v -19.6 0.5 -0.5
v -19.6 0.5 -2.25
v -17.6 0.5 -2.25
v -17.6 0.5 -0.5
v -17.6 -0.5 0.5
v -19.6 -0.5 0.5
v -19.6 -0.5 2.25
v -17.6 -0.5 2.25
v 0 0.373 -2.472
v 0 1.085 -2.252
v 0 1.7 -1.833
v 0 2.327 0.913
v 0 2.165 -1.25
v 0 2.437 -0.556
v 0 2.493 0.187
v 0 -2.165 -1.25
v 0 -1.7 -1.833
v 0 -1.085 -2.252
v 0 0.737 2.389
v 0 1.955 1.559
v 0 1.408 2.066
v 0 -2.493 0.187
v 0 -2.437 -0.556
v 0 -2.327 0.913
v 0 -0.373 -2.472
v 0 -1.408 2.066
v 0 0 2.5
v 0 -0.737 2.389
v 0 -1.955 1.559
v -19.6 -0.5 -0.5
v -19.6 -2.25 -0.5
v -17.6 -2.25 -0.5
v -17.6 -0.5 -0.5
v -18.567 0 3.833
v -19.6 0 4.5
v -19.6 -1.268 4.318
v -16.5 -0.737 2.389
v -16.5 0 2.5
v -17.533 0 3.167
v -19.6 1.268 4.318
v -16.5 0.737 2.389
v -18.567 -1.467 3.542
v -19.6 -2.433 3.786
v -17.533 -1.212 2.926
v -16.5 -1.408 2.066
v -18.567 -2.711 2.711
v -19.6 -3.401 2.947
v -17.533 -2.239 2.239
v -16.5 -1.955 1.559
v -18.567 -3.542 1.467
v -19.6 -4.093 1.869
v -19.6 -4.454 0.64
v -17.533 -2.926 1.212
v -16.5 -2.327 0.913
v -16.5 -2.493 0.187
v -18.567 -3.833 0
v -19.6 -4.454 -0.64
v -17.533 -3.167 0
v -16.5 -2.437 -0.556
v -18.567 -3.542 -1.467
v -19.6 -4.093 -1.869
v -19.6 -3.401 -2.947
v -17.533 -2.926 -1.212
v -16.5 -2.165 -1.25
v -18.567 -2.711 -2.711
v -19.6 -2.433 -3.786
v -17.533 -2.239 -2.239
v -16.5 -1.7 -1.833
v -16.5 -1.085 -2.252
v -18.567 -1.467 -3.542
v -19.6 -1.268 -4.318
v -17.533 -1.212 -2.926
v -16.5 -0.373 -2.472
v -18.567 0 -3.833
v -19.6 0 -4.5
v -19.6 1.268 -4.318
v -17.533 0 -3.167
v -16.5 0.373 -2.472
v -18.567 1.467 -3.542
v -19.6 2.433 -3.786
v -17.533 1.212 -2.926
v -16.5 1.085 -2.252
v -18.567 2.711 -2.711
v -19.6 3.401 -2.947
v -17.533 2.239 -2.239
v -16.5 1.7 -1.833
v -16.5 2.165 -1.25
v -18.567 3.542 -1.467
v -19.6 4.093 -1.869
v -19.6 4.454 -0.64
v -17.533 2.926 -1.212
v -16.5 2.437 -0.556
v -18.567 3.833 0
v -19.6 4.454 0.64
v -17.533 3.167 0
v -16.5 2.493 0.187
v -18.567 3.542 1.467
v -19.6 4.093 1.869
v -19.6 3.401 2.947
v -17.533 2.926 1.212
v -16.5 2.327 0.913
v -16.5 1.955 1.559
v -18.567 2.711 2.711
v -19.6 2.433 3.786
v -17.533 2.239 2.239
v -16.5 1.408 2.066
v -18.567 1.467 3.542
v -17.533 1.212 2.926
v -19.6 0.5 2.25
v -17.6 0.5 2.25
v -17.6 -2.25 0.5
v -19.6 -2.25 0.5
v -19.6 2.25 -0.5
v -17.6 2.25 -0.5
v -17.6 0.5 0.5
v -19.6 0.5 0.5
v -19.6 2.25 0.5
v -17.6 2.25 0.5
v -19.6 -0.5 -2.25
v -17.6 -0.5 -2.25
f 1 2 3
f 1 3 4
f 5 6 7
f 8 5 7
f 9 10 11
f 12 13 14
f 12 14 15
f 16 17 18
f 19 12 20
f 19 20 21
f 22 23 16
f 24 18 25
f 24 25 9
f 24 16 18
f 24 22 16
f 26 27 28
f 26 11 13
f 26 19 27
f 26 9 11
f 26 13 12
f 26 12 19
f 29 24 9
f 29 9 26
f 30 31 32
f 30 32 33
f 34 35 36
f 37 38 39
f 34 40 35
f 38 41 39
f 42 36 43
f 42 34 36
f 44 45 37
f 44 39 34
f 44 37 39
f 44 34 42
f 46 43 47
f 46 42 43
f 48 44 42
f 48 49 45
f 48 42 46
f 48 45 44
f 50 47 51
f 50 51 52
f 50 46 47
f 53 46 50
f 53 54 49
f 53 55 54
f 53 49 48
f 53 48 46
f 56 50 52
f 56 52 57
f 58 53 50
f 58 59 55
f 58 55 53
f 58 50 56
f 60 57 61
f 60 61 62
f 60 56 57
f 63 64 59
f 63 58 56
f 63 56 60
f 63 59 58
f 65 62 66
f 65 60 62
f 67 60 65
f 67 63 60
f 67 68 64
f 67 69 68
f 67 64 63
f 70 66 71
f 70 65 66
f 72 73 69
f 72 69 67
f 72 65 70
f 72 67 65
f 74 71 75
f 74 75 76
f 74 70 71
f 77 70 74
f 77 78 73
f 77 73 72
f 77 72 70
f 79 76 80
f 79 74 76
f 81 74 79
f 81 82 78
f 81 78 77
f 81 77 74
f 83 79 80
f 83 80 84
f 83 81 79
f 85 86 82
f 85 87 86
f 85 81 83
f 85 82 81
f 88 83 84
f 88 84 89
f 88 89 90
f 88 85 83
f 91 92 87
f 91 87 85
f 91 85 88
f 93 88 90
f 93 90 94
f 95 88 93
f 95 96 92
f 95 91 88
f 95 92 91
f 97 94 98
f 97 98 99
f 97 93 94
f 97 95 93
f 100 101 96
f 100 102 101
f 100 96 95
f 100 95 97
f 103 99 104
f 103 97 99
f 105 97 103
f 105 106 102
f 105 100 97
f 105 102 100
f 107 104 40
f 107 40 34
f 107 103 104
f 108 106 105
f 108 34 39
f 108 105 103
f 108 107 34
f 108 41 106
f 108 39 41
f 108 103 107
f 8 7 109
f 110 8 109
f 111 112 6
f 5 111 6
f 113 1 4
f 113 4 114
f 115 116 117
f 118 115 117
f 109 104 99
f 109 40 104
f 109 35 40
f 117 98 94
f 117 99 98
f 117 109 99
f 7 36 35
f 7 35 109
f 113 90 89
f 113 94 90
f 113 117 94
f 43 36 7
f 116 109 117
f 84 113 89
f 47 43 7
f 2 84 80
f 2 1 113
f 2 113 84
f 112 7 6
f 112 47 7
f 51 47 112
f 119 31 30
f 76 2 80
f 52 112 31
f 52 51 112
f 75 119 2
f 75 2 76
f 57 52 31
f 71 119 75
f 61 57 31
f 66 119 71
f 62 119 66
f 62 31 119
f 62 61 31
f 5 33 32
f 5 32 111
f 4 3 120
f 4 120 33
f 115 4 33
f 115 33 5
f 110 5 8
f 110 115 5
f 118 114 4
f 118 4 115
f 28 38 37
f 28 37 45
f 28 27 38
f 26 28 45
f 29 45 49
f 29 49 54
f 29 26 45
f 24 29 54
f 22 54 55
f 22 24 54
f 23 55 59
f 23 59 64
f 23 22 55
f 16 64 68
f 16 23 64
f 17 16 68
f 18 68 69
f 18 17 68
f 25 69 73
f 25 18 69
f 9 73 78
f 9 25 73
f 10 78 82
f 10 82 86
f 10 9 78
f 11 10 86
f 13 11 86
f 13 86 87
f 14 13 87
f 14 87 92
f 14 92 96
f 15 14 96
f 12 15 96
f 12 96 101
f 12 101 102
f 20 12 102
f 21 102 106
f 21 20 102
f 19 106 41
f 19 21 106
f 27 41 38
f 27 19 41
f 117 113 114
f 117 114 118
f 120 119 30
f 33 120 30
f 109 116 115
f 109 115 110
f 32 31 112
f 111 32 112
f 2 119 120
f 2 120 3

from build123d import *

# Parameters (mm, degrees)
SKETCH_2_W          = 1
SKETCH_2_H          = 1.75
SKETCH_2_W_2        = 1.75
SKETCH_2_H_2        = 1
CUT_EXTRUDE_1_DEPTH = 2


with BuildPart() as part:
    # Эскиз1 → Повернуть1 (revolve)
    with BuildSketch(Plane.XY, mode=Mode.PRIVATE) as revolve_1_sk:
        Polygon((-19.6, 0), (-19.6, 4.5), (-16.5, 2.5), (0, 2.5), (0, 0), align=None)
    revolve(revolve_1_sk.sketch.rotate(Axis((-51.630571285, 0, 0), (1, 0, 0)), 90), axis=Axis((-51.630571285, 0, 0), (1, 0, 0)))

    # Эскиз2 → Вырез-Вытянуть1 (cut)
    with BuildSketch(Plane.ZY.offset(19.6)):
        with Locations((0, 1.375)):
            Rectangle(SKETCH_2_W, SKETCH_2_H)
        with Locations((1.375, 0)):
            Rectangle(SKETCH_2_W_2, SKETCH_2_H_2)
        with Locations((0, -1.375)):
            Rectangle(SKETCH_2_W, SKETCH_2_H)
        with Locations((-1.375, 0)):
            Rectangle(SKETCH_2_W_2, SKETCH_2_H_2)
        Rectangle(SKETCH_2_W, SKETCH_2_H_2)
    extrude(amount=-CUT_EXTRUDE_1_DEPTH, mode=Mode.SUBTRACT)


solid = part.part
